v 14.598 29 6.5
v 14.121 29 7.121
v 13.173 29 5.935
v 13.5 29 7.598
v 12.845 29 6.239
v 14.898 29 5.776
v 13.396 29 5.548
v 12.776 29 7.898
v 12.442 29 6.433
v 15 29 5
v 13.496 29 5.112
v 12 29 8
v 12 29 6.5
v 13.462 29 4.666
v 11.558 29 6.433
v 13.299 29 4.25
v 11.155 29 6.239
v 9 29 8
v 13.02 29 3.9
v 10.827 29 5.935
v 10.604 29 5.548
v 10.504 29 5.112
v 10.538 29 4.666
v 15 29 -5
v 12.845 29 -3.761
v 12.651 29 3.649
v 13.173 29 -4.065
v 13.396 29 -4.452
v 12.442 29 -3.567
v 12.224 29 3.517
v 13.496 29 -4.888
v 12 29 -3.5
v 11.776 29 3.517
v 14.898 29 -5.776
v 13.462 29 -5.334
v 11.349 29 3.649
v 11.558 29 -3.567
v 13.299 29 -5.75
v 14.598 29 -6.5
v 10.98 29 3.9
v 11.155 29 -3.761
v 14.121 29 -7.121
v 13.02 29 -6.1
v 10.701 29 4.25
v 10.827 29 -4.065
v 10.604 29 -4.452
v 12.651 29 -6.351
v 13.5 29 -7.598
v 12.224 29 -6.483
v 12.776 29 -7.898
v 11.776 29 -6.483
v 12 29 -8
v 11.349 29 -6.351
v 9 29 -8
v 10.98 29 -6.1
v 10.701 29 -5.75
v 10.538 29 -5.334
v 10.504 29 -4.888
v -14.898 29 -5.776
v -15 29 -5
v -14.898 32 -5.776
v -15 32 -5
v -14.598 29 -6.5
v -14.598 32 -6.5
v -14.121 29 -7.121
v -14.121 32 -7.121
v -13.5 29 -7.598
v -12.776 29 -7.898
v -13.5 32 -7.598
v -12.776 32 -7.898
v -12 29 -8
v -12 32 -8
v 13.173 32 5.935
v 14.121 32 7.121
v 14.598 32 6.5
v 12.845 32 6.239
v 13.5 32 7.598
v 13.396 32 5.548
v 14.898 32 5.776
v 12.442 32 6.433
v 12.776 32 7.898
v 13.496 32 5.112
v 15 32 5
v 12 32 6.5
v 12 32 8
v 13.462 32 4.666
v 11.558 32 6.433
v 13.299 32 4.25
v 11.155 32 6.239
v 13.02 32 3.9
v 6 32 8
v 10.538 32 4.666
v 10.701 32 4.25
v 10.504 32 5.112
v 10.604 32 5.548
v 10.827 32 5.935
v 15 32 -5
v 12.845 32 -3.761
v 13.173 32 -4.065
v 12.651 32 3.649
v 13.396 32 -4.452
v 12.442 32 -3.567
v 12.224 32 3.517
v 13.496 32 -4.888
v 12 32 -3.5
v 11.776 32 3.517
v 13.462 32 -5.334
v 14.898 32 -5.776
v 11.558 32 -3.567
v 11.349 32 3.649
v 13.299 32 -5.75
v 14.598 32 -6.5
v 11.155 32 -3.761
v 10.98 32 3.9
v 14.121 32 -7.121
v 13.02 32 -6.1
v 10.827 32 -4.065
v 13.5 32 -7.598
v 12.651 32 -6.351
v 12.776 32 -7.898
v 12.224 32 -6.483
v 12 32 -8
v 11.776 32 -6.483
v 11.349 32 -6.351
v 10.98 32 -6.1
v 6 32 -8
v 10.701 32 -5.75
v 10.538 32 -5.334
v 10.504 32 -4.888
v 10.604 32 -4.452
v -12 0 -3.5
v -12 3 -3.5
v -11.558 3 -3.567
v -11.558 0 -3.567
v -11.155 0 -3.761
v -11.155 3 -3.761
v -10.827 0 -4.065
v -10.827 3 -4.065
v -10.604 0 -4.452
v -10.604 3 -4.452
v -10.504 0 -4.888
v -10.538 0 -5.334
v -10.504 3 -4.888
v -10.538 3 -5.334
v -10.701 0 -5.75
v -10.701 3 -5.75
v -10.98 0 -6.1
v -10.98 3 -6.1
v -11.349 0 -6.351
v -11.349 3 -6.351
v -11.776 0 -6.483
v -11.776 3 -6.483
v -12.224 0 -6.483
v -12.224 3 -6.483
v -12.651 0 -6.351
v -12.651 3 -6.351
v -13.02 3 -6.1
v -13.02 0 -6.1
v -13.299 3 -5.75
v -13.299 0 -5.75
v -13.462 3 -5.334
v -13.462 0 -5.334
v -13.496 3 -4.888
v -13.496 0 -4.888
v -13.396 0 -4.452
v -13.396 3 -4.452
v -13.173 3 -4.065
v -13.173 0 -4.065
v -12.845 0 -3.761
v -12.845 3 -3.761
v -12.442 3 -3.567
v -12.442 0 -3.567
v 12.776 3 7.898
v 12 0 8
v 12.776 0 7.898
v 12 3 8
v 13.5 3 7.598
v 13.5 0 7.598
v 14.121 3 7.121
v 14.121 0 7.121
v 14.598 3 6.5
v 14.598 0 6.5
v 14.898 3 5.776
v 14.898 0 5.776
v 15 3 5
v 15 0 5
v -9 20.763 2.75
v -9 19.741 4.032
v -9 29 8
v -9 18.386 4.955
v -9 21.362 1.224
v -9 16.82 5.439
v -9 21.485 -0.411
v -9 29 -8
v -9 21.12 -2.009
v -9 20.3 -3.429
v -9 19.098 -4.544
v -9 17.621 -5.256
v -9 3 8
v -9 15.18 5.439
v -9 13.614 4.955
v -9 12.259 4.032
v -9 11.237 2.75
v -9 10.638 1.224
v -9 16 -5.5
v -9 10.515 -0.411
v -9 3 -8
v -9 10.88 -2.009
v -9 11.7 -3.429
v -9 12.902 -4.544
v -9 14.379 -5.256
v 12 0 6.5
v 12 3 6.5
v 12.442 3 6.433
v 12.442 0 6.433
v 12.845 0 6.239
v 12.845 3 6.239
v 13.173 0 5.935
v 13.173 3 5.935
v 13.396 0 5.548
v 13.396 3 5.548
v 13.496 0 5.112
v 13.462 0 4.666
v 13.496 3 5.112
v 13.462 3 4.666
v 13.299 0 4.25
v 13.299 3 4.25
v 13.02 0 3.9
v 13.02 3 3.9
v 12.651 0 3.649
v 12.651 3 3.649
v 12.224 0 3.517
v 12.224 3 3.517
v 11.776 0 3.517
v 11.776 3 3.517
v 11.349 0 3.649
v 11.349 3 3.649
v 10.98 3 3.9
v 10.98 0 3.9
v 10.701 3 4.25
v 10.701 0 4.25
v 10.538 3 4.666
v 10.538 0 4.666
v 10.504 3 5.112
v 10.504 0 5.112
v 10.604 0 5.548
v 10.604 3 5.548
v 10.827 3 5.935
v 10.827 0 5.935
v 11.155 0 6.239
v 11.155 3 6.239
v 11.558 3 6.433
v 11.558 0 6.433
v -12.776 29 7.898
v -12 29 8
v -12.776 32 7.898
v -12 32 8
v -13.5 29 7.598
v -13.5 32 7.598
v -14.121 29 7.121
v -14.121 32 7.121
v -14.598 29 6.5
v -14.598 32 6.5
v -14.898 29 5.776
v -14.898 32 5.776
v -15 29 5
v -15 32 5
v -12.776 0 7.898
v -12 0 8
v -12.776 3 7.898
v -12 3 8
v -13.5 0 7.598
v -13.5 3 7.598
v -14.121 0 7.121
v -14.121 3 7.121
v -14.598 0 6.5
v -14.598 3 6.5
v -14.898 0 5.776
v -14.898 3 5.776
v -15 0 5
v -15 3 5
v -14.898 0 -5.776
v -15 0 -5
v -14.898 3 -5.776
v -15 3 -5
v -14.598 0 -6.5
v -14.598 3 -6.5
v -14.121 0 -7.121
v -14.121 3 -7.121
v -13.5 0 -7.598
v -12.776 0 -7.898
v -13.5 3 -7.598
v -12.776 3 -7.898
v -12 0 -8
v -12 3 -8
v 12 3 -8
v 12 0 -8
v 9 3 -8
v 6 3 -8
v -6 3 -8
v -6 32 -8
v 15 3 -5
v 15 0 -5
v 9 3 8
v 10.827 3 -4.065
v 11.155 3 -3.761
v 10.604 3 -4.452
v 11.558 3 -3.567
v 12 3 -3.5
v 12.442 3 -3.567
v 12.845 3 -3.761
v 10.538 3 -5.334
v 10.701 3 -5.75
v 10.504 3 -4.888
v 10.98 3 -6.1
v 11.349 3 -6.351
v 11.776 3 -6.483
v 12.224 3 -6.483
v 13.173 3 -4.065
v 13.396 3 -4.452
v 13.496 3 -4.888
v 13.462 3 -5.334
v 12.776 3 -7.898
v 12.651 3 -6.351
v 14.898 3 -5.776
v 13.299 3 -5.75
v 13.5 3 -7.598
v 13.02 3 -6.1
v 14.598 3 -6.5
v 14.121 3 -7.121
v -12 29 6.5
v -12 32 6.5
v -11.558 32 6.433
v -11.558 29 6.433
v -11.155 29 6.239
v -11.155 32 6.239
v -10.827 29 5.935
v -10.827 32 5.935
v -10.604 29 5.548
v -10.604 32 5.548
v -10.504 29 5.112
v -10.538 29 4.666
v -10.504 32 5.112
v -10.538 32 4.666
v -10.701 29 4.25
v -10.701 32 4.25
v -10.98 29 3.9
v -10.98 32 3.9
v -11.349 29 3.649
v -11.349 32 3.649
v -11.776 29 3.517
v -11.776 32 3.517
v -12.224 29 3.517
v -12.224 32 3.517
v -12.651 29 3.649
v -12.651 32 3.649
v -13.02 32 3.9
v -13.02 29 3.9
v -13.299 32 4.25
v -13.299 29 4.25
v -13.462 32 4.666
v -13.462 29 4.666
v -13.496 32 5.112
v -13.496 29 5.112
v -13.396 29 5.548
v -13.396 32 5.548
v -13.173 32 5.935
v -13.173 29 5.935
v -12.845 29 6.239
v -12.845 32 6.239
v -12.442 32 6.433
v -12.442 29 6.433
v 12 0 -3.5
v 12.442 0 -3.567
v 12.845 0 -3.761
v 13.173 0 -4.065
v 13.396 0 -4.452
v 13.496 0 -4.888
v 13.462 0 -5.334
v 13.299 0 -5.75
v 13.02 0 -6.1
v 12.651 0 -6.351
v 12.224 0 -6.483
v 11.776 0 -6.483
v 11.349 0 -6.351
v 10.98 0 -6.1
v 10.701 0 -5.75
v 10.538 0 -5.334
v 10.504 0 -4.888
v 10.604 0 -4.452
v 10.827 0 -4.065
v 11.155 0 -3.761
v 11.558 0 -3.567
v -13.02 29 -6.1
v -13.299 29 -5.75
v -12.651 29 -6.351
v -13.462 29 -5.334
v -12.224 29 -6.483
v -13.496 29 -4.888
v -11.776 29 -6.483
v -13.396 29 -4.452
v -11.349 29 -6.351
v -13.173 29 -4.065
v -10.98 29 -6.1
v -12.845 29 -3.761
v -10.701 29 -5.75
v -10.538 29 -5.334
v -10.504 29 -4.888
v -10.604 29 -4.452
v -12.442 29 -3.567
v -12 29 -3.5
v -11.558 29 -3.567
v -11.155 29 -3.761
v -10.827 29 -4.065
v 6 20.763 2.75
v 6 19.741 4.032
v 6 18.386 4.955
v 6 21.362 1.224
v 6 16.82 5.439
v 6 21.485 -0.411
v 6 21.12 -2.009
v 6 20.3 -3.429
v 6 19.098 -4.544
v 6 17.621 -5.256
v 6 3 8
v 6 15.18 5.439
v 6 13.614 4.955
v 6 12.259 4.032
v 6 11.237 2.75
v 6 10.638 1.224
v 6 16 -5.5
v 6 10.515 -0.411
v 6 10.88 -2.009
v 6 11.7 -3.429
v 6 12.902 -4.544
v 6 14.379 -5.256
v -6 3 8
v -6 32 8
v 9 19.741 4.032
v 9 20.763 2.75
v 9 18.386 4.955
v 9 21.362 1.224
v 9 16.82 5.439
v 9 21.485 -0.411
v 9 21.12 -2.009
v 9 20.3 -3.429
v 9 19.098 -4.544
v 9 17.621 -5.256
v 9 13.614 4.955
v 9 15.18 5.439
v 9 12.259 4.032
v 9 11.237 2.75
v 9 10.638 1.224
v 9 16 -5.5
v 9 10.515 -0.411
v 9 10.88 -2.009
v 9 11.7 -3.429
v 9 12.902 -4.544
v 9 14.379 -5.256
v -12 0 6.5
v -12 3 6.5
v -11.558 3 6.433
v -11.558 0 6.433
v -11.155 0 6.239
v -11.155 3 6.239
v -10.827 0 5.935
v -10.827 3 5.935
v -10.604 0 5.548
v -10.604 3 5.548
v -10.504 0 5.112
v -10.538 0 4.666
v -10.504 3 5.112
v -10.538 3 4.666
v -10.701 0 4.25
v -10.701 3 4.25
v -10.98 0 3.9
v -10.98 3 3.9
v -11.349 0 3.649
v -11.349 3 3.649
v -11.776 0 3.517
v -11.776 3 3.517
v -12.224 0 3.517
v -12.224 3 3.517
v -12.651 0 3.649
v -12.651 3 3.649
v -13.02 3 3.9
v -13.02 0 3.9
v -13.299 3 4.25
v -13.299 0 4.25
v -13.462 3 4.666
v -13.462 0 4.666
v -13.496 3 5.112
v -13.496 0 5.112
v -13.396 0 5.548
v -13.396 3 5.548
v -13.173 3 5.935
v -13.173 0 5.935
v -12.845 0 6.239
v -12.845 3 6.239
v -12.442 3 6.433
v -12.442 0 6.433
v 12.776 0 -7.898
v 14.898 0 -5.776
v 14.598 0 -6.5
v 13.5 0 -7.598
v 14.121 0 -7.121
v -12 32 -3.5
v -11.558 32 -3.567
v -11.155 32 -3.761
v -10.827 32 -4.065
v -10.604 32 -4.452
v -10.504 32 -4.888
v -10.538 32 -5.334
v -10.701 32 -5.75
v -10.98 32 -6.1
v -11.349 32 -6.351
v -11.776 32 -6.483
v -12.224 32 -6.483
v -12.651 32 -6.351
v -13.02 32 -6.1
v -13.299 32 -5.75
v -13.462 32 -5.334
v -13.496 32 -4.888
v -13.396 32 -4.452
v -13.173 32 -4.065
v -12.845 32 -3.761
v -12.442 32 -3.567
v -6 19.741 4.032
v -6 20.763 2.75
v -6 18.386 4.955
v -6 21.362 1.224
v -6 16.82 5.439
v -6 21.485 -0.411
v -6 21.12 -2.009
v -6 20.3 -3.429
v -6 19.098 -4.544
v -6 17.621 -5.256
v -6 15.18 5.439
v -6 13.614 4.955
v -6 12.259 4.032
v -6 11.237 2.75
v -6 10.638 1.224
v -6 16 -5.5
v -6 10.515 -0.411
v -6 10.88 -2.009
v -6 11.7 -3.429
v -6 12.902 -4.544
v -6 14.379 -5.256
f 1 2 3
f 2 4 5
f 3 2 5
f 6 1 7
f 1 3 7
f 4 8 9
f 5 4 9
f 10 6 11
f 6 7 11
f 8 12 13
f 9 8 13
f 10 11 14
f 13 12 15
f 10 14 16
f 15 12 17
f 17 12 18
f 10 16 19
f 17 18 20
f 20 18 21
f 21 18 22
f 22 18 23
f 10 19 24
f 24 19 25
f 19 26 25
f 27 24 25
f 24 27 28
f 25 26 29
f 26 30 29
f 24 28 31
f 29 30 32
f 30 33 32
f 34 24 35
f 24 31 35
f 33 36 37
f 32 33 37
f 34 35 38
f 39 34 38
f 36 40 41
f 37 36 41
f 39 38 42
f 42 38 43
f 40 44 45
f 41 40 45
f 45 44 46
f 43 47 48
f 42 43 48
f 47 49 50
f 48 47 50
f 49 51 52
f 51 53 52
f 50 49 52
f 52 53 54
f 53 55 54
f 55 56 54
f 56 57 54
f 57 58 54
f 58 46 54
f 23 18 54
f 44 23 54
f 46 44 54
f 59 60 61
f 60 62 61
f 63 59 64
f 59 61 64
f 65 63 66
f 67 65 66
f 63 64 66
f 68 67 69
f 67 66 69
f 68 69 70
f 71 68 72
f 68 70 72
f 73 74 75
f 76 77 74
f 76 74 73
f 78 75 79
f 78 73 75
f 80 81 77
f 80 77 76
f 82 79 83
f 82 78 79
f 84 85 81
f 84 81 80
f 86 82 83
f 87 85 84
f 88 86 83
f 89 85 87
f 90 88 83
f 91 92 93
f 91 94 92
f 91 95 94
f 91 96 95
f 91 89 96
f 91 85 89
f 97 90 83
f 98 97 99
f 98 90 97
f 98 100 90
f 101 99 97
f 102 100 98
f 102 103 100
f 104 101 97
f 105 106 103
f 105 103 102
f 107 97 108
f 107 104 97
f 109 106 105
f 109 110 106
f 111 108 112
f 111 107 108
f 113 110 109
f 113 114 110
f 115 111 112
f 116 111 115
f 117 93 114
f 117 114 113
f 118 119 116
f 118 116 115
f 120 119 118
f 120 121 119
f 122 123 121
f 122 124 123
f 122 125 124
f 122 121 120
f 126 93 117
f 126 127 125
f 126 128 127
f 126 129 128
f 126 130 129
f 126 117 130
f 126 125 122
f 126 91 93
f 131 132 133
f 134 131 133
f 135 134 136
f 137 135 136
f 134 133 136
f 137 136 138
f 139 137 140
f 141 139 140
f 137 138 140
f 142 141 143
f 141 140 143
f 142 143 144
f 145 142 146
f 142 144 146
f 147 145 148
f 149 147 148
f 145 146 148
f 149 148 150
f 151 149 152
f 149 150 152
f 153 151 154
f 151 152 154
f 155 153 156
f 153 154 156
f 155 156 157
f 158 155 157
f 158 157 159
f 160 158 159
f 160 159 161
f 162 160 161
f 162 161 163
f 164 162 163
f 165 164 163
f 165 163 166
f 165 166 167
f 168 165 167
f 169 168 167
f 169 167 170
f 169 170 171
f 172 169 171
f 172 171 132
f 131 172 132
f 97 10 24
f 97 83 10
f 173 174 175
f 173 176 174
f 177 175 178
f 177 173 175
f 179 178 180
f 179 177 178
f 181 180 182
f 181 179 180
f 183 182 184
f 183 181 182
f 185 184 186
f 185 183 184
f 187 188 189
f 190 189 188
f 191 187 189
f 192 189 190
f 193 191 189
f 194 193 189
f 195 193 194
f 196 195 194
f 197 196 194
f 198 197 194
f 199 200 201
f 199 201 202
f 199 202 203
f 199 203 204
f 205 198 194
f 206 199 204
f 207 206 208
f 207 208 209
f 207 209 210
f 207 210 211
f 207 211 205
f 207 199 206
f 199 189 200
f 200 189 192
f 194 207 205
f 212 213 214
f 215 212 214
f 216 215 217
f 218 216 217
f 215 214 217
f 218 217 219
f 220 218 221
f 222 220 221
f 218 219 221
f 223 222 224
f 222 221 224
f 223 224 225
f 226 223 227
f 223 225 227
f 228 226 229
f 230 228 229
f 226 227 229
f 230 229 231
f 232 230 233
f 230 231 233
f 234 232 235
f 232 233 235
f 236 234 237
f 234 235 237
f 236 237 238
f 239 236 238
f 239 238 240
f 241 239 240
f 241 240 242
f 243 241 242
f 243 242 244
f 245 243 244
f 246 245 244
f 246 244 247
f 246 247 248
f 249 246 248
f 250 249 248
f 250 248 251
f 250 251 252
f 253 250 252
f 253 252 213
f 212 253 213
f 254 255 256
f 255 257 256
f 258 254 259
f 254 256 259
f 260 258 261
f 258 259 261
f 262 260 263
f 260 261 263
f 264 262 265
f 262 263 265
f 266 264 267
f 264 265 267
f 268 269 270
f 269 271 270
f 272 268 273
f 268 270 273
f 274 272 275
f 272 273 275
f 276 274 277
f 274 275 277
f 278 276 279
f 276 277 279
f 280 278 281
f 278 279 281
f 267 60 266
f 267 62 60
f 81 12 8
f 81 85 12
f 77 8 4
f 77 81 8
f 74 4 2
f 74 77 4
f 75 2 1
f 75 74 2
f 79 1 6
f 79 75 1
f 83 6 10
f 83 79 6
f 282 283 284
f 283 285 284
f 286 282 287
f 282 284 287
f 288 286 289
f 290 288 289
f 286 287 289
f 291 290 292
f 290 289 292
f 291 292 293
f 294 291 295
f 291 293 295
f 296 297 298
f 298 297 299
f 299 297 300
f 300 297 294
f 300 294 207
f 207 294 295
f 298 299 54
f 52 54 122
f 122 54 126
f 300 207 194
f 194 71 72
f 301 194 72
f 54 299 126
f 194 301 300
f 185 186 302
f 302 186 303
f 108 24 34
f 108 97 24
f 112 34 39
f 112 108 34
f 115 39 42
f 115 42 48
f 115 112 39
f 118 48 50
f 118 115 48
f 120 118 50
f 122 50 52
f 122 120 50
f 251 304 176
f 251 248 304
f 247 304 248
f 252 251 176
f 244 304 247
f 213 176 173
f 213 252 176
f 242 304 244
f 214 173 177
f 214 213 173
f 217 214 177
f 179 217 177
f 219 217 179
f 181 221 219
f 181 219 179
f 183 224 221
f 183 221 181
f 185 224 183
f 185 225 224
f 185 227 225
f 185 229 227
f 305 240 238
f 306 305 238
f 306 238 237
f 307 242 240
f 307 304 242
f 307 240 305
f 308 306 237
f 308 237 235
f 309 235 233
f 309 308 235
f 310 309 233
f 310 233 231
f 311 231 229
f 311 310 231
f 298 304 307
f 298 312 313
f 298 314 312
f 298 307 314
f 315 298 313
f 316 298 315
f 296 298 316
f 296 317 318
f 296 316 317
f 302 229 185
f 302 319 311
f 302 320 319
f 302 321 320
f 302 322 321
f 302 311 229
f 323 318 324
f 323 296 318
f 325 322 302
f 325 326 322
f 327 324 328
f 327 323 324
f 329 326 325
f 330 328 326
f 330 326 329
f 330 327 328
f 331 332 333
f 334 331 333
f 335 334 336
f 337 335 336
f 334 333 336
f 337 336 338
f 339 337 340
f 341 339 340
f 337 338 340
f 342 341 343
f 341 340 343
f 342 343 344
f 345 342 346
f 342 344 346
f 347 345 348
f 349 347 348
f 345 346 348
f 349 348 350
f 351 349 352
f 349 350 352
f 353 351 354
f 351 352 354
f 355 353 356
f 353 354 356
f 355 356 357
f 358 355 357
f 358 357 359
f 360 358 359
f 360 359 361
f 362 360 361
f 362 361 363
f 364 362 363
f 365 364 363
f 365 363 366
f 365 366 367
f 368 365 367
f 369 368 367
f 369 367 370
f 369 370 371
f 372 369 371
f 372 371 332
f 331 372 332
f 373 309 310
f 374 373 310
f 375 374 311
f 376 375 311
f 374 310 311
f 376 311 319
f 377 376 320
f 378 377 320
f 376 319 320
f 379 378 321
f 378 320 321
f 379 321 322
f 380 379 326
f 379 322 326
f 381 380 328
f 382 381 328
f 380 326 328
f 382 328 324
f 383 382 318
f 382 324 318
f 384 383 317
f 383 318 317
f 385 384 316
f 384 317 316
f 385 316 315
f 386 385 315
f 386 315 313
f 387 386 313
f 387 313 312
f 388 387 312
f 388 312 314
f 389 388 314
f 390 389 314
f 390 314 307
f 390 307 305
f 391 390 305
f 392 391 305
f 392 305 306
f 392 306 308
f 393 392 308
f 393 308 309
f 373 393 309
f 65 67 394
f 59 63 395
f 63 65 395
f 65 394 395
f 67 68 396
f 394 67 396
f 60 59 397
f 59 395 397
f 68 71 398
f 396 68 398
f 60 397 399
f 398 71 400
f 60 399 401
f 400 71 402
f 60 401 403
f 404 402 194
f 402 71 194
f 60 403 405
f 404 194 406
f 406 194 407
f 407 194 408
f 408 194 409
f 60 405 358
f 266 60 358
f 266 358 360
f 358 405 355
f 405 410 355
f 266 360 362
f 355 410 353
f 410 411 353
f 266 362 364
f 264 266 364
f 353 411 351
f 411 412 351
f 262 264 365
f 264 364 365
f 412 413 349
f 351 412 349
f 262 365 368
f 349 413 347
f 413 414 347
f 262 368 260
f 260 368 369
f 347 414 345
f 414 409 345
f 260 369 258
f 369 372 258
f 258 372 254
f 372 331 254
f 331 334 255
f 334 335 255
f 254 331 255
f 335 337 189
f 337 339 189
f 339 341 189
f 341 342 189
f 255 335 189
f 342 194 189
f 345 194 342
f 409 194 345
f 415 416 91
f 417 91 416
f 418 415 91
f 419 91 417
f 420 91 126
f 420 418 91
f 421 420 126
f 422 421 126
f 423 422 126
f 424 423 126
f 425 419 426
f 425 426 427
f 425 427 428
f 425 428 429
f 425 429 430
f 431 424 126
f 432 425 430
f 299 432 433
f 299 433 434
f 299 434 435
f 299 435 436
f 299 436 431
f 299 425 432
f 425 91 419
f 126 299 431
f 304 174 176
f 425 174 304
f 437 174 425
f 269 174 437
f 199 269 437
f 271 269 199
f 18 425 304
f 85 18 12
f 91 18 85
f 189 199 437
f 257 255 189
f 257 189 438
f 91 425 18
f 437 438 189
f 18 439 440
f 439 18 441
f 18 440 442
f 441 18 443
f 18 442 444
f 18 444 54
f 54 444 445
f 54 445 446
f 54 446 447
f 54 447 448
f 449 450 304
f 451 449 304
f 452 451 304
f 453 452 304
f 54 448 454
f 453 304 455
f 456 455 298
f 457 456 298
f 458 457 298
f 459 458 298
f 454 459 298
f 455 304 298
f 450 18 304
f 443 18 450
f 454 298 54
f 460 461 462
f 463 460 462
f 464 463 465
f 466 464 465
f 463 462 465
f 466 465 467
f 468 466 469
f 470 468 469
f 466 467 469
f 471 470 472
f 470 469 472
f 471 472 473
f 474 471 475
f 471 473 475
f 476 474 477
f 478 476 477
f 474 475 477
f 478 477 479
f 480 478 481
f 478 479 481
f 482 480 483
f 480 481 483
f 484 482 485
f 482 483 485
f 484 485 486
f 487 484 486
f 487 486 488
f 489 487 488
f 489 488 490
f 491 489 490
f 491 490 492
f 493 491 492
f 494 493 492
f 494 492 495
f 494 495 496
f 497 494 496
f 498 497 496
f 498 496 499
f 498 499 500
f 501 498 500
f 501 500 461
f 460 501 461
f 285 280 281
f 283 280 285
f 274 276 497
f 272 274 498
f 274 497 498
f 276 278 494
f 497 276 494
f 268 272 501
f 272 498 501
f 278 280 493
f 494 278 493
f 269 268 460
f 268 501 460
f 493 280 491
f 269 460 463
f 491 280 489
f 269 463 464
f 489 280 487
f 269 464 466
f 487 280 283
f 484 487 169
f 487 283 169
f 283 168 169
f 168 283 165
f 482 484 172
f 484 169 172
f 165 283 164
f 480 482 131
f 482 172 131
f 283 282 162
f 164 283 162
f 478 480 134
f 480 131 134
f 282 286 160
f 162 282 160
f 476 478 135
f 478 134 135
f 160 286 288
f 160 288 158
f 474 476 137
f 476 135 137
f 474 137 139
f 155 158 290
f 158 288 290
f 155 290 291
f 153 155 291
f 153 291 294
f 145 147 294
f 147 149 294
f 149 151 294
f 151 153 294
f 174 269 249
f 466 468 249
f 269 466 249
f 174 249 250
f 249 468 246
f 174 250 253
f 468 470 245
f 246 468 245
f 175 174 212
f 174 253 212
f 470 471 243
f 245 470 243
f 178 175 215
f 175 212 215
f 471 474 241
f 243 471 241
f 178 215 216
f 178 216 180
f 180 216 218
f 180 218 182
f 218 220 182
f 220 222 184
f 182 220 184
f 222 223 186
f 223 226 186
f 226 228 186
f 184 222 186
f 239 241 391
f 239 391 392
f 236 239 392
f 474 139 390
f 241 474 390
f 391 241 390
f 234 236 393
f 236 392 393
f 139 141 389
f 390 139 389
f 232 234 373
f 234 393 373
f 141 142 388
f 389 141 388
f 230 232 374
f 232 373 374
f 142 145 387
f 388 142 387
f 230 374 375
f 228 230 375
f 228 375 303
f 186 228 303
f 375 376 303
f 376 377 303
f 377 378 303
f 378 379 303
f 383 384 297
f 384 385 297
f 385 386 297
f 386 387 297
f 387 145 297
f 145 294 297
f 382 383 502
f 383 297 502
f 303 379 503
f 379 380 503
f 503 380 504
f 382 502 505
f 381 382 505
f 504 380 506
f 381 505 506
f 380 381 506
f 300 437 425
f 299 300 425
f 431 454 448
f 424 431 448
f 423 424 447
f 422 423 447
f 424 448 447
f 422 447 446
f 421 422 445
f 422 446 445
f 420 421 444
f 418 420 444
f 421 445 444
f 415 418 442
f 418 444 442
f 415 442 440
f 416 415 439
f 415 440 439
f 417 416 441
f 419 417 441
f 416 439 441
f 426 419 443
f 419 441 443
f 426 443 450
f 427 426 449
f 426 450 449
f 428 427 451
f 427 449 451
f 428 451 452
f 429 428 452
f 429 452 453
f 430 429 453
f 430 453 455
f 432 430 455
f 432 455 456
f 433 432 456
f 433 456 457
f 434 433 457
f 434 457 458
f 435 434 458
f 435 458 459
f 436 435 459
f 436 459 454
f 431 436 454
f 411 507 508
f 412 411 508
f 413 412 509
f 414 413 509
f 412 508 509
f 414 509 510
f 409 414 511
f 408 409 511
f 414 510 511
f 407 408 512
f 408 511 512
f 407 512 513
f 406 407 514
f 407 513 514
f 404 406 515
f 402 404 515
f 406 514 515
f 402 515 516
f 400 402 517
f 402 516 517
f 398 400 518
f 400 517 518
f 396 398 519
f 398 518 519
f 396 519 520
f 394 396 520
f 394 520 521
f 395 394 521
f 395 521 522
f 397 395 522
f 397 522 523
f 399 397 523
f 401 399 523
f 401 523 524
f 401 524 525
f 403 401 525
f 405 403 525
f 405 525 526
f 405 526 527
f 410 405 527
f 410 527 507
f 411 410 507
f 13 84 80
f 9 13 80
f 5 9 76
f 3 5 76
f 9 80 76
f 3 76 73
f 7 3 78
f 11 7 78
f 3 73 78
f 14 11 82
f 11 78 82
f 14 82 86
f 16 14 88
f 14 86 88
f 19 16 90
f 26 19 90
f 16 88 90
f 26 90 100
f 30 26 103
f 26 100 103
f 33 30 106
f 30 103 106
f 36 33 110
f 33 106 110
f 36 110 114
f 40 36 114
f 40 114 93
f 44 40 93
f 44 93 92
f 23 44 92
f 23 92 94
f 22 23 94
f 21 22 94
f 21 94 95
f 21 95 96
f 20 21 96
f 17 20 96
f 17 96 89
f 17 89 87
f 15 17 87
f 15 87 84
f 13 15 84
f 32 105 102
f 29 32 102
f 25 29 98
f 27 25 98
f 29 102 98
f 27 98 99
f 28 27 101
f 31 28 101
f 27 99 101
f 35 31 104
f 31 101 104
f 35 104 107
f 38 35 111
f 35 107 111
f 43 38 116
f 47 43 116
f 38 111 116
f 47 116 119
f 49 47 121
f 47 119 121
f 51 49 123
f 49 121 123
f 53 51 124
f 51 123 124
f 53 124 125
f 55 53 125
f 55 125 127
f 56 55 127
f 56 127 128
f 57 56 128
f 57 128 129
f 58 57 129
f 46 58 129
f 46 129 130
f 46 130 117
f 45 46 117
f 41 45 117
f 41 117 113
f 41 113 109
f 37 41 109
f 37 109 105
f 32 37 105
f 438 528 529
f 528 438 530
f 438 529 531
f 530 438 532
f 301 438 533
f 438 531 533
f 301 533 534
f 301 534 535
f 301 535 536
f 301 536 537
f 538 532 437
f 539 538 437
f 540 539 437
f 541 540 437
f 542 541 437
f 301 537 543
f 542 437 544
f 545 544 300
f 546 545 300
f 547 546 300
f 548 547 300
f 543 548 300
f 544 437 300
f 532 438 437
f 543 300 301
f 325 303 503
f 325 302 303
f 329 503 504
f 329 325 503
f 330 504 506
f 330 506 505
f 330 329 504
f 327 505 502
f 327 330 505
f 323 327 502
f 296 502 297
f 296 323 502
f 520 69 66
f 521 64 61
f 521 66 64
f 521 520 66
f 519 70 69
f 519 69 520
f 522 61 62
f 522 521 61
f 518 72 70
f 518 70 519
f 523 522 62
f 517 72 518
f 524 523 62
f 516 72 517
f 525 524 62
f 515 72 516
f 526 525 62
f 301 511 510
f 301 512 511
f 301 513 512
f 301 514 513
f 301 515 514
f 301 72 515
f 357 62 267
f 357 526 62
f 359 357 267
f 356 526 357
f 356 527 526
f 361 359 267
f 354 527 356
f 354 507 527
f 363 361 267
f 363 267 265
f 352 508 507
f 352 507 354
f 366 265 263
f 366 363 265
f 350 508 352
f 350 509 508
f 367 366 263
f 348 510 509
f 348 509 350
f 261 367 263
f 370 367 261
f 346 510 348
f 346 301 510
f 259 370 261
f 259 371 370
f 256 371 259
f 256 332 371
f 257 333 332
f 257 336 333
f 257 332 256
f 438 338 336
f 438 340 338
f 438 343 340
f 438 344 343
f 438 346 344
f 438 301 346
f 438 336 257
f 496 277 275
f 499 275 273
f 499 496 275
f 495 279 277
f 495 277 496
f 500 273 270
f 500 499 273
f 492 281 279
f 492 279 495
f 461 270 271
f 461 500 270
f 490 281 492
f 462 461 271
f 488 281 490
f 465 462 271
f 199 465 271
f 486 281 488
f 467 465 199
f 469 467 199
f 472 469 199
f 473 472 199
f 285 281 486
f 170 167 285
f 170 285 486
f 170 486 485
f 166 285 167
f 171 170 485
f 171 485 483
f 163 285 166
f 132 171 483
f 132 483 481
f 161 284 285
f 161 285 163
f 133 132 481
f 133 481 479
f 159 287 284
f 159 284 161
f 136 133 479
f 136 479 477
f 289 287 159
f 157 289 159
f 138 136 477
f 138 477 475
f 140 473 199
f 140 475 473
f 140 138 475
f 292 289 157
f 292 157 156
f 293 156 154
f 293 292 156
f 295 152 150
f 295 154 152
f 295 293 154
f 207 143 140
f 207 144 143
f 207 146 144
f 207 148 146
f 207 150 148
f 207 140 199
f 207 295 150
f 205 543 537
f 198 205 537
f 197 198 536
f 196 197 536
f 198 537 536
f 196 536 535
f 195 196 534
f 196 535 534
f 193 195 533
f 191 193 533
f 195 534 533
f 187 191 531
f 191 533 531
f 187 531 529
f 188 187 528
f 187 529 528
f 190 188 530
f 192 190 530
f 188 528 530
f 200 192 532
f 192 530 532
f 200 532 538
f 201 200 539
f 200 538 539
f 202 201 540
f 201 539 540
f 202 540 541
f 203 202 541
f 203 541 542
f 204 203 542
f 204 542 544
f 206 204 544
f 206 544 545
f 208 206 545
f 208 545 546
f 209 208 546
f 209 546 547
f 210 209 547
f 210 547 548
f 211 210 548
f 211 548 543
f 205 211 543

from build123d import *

# Parameters (mm, degrees)
SKETCH_1_W          = 30
SKETCH_1_H          = 16
EXTRUDE_1_DEPTH     = 3
SKETCH_2_W          = 3
SKETCH_2_H          = 16
EXTRUDE_2_DEPTH     = 29
SKETCH_4_W          = 16
SKETCH_4_H          = 3
EXTRUDE_3_DEPTH     = 6
SKETCH_5_W          = 16
SKETCH_5_H          = 3
EXTRUDE_4_DEPTH     = 6
SKETCH_6_R          = 5.5
CUT_EXTRUDE_1_DEPTH = 41.792156109
SKETCH_7_R          = 1.5
CUT_EXTRUDE_2_DEPTH = 37.235341864
FILLET_1_R          = 3


with BuildPart() as part:
    # 草图1 → 凸台-拉伸1 (new body)
    with BuildSketch(Plane(origin=(0, 0, 0), x_dir=(1, 0, 0), z_dir=(0, 1, 0))):
        Rectangle(SKETCH_1_W, SKETCH_1_H)
    extrude(amount=EXTRUDE_1_DEPTH)

    # 草图2 → 凸台-拉伸2 (add)
    with BuildSketch(Plane(origin=(0, 3, 0), x_dir=(1, 0, 0), z_dir=(0, 1, 0))):
        with Locations((7.5, 0)):
            Rectangle(SKETCH_2_W, SKETCH_2_H)
        with Locations((-7.5, 0)):
            Rectangle(SKETCH_2_W, SKETCH_2_H)
    extrude(amount=EXTRUDE_2_DEPTH)

    # 草图4 → 凸台-拉伸3 (add)
    with BuildSketch(Plane.ZY.offset(9)):
        with Locations((0, 30.5)):
            Rectangle(SKETCH_4_W, SKETCH_4_H)
    extrude(amount=EXTRUDE_3_DEPTH)

    # 草图5 → 凸台-拉伸4 (add)
    with BuildSketch(Plane(origin=(9, 0, 0), x_dir=(0, 0, -1), z_dir=(1, 0, 0))):
        with Locations((0, 30.5)):
            Rectangle(SKETCH_5_W, SKETCH_5_H)
    extrude(amount=EXTRUDE_4_DEPTH)

    # 草图6 → 切除-拉伸1 (cut, through all)
    with BuildSketch(Plane(origin=(9, 0, 0), x_dir=(0, 0, -1), z_dir=(1, 0, 0))):
        with Locations((0, 16)):
            Circle(SKETCH_6_R)
    extrude(amount=-CUT_EXTRUDE_1_DEPTH, mode=Mode.SUBTRACT)

    # 草图7 → 切除-拉伸2 (cut, through all)
    with BuildSketch(Plane(origin=(0, 32, 0), x_dir=(1, 0, 0), z_dir=(0, 1, 0))):
        with Locations(Location((12, 5, 0), (0, 0, 270))):
            Circle(SKETCH_7_R)
        with Locations(Location((12, -5, 0), (0, 0, 270))):
            Circle(SKETCH_7_R)
        with Locations(Location((-12, -5, 0), (0, 0, 270))):
            Circle(SKETCH_7_R)
        with Locations(Location((-12, 5, 0), (0, 0, 270))):
            Circle(SKETCH_7_R)
    extrude(amount=-CUT_EXTRUDE_2_DEPTH, mode=Mode.SUBTRACT)

    # 圆角1
    fillet_1_edges = [part.edges().sort_by_distance(p)[0] for p in [
        (-15, 30.5, -8),
        (-15, 30.5, 8),
        (15, 30.5, 8),
        (15, 30.5, -8),
        (15, 1.5, 8),
        (-15, 1.5, 8),
        (-15, 1.5, -8),
        (15, 1.5, -8),
    ]]
    fillet(fillet_1_edges, radius=FILLET_1_R)


solid = part.part
